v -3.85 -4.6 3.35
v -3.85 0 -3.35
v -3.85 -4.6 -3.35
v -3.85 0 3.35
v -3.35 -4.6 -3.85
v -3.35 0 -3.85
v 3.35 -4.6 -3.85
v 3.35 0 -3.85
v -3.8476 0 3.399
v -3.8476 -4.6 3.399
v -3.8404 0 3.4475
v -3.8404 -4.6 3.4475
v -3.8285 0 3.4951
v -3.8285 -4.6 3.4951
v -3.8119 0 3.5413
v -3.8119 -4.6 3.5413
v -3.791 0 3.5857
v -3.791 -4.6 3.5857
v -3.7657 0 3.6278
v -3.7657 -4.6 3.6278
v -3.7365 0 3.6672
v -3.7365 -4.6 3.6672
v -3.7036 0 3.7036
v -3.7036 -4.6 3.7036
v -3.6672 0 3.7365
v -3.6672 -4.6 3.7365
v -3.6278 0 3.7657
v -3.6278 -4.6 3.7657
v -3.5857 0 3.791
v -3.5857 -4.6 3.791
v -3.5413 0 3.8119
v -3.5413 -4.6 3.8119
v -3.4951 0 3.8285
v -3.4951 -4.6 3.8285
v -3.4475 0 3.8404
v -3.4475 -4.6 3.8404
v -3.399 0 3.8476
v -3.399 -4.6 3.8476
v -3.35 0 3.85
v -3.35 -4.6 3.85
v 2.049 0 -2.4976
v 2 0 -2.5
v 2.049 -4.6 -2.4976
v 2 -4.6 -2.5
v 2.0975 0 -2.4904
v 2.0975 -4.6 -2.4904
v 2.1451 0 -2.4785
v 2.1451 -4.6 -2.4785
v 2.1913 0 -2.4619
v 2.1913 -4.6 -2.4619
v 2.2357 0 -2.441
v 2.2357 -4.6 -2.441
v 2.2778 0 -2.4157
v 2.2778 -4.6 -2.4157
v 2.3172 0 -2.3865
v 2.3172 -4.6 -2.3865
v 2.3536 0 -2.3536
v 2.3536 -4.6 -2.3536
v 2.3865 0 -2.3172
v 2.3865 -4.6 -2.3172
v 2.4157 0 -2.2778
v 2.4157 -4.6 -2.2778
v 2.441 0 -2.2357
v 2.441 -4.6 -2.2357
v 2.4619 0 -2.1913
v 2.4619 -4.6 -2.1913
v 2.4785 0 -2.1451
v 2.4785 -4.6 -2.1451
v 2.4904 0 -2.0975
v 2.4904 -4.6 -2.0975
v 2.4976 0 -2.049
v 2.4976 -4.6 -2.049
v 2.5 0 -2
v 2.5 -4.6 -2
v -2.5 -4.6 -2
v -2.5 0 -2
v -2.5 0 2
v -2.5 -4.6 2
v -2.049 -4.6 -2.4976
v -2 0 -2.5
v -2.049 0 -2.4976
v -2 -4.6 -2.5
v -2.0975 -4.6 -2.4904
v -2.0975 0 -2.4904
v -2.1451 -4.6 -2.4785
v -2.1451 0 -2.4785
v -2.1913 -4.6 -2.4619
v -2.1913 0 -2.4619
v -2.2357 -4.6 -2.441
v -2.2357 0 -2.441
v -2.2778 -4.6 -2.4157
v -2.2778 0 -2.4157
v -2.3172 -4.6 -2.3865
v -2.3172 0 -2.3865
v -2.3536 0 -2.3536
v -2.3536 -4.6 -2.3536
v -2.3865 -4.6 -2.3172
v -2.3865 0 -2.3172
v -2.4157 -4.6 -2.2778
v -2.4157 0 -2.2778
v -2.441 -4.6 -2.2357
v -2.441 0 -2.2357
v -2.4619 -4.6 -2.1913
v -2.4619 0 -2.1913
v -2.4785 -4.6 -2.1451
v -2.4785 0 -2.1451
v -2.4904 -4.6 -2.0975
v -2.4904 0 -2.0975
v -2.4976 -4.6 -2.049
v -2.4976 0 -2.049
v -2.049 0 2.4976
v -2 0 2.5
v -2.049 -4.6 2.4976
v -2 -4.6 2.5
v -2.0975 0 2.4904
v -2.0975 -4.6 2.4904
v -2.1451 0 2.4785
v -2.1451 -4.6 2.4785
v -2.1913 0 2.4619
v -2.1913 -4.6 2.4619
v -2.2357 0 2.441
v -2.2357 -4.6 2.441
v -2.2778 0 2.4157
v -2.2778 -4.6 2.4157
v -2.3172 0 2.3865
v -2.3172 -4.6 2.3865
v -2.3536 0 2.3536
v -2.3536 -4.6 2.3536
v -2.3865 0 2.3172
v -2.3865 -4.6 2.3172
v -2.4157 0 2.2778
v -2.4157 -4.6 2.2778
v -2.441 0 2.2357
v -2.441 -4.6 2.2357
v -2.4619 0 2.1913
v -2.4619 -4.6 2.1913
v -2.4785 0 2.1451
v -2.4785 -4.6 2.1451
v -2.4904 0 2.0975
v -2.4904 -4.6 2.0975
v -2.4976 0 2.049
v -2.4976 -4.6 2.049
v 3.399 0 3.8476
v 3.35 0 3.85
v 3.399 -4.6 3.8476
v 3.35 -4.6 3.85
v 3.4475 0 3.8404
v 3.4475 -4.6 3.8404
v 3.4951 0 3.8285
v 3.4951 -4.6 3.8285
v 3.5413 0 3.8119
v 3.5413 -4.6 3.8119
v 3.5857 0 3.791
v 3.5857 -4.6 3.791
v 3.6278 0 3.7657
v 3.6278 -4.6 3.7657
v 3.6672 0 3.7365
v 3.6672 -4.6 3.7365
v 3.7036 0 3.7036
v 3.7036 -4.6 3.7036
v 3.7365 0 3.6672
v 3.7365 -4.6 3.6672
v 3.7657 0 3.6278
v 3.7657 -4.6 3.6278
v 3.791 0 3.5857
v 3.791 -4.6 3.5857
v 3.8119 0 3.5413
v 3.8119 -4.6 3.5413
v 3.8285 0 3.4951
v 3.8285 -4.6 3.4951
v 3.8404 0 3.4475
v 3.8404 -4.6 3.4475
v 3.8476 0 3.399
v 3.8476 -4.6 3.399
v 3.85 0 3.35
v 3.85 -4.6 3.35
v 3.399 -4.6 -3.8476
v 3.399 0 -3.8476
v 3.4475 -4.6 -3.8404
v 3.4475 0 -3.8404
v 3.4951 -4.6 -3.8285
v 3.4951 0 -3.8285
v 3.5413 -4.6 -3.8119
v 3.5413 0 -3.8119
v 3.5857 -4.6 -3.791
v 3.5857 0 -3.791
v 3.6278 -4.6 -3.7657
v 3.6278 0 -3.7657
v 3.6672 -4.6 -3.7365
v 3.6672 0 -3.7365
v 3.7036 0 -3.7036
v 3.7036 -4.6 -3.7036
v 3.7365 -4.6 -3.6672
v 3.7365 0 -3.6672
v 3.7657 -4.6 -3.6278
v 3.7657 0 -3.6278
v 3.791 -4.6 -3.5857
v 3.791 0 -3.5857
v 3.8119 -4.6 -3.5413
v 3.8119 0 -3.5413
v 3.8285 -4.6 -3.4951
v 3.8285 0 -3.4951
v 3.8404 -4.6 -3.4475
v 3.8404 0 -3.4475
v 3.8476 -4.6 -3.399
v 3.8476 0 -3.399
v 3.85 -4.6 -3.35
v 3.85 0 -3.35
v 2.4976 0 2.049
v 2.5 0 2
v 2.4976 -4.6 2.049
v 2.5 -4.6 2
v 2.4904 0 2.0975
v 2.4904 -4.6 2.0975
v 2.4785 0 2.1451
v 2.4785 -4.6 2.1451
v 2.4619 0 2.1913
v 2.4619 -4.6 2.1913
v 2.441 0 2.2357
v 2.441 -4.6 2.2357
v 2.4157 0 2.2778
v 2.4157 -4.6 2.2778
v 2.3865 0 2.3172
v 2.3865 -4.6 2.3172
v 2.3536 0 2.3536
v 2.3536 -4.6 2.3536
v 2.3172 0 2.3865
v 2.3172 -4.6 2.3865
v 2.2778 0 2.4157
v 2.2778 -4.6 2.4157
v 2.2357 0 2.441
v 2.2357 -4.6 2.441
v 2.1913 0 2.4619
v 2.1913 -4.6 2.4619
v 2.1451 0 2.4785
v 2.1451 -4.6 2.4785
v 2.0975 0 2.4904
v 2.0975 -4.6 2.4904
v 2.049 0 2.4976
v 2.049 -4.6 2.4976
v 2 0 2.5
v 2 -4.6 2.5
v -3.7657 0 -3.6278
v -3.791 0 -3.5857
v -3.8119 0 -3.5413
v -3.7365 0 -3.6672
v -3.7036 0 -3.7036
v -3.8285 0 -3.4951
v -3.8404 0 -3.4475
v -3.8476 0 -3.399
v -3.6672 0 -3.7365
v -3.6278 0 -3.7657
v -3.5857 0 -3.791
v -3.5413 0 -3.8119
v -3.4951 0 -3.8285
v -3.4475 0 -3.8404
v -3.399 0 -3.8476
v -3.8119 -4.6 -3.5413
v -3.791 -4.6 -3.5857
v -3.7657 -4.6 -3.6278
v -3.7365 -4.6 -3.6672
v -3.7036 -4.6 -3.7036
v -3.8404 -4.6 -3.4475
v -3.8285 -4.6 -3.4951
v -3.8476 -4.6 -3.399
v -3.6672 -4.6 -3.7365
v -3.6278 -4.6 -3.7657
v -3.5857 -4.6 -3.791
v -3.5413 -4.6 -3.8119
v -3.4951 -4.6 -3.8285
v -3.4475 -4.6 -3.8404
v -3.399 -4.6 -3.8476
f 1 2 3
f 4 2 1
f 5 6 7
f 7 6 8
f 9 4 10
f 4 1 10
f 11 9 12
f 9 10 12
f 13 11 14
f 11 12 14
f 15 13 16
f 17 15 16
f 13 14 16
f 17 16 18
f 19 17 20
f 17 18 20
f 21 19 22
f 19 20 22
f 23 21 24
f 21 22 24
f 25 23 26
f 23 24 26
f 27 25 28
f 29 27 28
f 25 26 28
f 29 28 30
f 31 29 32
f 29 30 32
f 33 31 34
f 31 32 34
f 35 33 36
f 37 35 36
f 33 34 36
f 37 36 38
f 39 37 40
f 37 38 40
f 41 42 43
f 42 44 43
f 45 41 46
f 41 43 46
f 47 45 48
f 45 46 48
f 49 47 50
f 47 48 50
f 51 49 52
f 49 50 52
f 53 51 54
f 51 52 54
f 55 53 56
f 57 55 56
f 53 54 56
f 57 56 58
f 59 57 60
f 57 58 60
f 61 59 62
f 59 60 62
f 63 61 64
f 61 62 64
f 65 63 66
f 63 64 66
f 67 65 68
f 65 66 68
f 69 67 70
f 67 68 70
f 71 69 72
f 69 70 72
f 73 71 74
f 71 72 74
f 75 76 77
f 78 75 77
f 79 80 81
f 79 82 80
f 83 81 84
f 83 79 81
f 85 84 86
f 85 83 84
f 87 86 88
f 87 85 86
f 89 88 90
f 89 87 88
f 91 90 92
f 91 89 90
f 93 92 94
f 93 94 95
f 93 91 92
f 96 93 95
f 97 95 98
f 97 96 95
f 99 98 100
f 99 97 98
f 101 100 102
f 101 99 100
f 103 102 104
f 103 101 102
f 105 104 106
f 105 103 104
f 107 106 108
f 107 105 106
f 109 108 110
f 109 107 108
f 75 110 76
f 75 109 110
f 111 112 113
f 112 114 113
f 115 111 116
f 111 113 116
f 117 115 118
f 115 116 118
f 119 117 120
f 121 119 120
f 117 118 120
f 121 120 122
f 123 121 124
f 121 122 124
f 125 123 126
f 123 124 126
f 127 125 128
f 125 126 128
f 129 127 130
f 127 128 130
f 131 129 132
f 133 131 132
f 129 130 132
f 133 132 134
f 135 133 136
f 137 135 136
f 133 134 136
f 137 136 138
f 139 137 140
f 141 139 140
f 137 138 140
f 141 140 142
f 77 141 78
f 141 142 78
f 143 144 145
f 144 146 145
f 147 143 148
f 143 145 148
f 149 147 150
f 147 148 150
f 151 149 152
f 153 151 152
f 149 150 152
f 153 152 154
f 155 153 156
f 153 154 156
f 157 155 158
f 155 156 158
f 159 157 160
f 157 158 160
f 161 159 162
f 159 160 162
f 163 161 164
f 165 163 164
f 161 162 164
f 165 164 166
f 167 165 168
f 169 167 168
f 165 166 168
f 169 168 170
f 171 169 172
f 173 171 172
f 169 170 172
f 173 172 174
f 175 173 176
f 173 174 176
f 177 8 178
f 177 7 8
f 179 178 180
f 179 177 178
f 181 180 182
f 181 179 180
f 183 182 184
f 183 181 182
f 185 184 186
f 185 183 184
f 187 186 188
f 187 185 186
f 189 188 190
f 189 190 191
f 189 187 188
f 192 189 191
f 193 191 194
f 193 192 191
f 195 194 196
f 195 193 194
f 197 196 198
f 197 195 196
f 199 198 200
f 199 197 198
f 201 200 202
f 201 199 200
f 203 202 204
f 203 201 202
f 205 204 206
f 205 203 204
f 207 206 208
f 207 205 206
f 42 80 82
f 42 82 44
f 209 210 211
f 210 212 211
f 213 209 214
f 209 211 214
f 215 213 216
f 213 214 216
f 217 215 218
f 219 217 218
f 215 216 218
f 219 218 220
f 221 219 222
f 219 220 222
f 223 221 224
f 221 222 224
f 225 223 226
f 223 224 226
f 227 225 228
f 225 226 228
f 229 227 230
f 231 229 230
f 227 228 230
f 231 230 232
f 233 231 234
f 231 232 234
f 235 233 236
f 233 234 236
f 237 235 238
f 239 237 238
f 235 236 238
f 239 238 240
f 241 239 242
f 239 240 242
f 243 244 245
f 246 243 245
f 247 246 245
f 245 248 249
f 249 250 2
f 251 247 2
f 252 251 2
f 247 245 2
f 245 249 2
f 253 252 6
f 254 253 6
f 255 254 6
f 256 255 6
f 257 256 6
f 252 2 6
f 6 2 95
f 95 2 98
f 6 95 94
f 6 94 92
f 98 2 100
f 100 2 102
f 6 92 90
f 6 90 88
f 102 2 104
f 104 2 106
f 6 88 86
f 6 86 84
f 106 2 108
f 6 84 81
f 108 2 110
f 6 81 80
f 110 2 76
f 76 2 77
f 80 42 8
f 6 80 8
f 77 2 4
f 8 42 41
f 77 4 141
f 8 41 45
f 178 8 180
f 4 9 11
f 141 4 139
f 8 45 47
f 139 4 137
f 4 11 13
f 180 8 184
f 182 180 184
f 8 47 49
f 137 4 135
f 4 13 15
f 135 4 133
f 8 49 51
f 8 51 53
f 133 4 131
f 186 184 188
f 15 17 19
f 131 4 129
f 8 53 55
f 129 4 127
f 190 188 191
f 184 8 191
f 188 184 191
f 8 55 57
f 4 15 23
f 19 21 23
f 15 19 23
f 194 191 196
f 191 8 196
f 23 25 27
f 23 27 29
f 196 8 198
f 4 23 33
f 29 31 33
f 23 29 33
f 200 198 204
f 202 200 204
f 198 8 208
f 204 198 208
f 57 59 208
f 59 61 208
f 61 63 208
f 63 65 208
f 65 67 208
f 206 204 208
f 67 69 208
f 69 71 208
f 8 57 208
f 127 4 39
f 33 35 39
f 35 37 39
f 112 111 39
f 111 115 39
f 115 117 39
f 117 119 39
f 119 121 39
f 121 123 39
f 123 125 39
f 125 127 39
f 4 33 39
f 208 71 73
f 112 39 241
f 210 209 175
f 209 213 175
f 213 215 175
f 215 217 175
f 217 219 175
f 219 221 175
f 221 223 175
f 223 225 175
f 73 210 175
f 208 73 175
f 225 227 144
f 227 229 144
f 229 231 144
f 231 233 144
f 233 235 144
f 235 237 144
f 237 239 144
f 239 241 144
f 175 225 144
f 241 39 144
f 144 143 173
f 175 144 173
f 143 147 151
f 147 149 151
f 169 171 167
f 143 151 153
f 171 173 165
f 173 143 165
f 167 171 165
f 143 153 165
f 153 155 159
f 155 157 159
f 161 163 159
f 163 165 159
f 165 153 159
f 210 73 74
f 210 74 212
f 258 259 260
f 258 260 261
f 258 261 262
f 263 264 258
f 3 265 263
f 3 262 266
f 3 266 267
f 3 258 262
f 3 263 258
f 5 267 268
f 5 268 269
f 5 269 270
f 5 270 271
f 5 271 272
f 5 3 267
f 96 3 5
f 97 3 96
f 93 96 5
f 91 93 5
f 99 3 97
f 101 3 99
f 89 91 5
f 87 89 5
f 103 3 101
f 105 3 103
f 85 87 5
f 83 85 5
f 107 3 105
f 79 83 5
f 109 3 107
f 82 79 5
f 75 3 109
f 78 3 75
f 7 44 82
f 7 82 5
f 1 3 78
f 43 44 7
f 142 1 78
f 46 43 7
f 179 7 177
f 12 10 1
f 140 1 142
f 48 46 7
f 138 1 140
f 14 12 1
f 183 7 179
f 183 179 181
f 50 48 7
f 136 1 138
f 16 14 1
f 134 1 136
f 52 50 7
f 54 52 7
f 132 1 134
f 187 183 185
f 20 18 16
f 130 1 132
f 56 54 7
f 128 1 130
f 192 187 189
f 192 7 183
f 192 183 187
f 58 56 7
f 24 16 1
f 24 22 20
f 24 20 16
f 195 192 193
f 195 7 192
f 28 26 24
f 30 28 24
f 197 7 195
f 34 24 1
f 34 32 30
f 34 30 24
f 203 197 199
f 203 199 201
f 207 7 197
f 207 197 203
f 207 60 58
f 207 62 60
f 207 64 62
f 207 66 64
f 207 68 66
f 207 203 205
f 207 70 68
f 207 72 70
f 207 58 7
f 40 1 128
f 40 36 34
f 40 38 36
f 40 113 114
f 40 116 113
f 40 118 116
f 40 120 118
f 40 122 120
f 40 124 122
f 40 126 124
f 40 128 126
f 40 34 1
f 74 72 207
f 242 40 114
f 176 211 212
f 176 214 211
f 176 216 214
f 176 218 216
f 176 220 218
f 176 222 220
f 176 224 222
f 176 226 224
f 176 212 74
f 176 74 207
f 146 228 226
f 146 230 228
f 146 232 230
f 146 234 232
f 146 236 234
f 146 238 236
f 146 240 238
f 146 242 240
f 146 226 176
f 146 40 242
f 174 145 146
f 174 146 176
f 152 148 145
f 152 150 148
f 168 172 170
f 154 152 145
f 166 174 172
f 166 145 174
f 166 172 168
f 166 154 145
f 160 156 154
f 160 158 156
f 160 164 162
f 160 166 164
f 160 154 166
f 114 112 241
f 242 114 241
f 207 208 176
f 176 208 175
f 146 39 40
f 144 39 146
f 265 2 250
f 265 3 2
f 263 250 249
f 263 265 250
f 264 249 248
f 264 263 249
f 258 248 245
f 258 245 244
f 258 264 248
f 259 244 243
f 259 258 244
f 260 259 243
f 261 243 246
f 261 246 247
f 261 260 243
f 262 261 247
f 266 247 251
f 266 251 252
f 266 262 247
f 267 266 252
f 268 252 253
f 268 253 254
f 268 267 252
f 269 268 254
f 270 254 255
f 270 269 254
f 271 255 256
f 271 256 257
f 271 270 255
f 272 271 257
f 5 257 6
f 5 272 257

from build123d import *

# Parameters (mm, degrees)
F0_W     = 7.7
F0_H     = 7.7
F0_W_2   = 5
F0_H_2   = 5
F1_DEPTH = 4.6
F2_R     = 0.5
F3_R     = 0.5


with BuildPart() as f1:
    # F0 (on Front) → F1 (new body)
    with BuildSketch(Plane.XZ):
        Rectangle(F0_W, F0_H)
        Rectangle(F0_W_2, F0_H_2, mode=Mode.SUBTRACT)
    extrude(amount=F1_DEPTH)

    # F2
    f2_edges = [f1.edges().sort_by_distance(p)[0] for p in [
        (2.5, -2.3, 2.5),
        (-2.5, -2.3, 2.5),
        (2.5, -2.3, -2.5),
        (-2.5, -2.3, -2.5),
    ]]
    fillet(f2_edges, radius=F2_R)

    # F3
    f3_edges = [f1.edges().sort_by_distance(p)[0] for p in [
        (3.85, -2.3, 3.85),
        (3.85, -2.3, -3.85),
        (-3.85, -2.3, -3.85),
        (-3.85, -2.3, 3.85),
    ]]
    fillet(f3_edges, radius=F3_R)


solid = f1.part
